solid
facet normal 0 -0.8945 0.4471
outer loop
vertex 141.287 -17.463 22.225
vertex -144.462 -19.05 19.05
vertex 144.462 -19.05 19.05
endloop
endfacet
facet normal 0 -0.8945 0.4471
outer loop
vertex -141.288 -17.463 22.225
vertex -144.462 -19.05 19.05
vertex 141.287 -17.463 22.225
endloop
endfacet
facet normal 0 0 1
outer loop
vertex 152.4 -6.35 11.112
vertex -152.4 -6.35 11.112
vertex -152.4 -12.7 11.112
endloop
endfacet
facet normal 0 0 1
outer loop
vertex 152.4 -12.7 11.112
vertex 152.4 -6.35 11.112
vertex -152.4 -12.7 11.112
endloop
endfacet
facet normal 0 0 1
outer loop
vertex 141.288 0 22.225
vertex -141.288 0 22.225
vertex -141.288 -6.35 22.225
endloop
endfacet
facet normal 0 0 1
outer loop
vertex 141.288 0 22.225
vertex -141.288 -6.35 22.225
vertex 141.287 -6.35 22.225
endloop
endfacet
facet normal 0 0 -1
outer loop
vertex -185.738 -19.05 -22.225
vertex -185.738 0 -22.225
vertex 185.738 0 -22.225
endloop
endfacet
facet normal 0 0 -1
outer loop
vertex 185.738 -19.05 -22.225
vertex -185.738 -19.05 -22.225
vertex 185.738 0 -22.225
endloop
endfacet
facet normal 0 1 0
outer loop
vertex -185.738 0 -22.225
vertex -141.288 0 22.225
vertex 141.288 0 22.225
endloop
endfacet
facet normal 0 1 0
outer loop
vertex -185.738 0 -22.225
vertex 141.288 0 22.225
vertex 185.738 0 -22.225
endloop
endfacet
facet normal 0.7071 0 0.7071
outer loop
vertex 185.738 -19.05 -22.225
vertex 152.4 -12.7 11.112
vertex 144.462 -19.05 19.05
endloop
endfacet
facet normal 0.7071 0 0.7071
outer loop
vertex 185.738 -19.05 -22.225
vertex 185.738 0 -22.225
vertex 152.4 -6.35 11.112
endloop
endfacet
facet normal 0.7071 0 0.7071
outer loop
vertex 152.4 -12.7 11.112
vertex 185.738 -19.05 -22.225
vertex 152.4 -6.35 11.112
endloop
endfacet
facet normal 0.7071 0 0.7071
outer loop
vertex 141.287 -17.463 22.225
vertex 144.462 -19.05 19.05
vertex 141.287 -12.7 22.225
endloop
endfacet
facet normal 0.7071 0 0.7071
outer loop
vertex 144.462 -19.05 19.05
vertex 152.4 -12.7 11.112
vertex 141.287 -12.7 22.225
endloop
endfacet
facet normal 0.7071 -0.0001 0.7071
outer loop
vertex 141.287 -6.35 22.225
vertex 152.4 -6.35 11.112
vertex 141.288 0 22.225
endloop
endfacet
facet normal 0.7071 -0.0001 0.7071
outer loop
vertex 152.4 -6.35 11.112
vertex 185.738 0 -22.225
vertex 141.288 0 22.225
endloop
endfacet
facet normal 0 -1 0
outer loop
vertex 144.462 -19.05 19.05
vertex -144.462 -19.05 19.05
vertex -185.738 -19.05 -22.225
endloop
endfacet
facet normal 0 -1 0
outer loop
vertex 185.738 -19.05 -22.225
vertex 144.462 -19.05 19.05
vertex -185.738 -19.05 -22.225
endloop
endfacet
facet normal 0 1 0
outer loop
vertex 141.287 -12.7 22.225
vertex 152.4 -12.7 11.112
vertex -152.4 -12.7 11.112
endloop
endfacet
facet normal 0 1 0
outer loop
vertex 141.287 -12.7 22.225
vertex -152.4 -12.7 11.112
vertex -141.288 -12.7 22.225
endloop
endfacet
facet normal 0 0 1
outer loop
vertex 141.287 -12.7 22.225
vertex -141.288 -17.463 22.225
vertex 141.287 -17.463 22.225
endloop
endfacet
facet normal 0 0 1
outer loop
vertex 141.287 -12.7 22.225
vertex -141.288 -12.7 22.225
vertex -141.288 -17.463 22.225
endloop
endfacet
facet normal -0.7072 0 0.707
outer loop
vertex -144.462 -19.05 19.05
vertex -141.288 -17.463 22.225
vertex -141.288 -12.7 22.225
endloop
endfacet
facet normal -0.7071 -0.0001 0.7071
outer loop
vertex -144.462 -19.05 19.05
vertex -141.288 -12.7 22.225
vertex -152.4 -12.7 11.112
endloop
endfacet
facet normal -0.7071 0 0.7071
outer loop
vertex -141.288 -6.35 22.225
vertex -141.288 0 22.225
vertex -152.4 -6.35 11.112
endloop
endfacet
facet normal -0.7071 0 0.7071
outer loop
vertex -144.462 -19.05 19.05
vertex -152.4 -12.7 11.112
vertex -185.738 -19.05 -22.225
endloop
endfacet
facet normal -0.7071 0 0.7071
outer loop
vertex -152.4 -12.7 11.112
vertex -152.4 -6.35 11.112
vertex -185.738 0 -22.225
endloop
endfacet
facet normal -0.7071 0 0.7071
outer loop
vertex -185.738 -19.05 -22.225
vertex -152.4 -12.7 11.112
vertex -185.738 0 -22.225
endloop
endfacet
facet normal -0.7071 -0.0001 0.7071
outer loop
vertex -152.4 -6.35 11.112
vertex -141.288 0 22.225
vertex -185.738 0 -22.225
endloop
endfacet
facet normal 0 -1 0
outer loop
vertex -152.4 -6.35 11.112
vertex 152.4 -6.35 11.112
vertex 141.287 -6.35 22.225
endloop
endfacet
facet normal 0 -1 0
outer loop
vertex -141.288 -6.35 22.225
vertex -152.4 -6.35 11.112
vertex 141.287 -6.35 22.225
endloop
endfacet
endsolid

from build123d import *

# Parameters (mm, degrees)
F0_W     = 371.475
F0_H     = 44.45
F1_DEPTH = 19.05
F2_W     = 6.35
F2_H     = 11.1125
F3_DEPTH = 371.476
F4_SIZE2 = 3.175
F4_SIZE  = 1.5875
F6_DEPTH = 19.051


with BuildPart() as f1:
    # F0 (on Front) → F1 (new body)
    with BuildSketch(Plane.XZ):
        Rectangle(F0_W, F0_H)
    extrude(amount=F1_DEPTH)

    # F2 (on face) → F3 (cut, through all)
    with BuildSketch(Plane(origin=(-185.7375, 0, 0), x_dir=(0, -1, 0), z_dir=(-1, 0, 0))):
        with Locations((9.525, 16.66875)):
            Rectangle(F2_W, F2_H)
    extrude(amount=-F3_DEPTH, mode=Mode.SUBTRACT)

    # F4
    f4_edges = [f1.edges().sort_by_distance(p)[0] for p in [
        (0, -19.05, 22.225),
    ]]
    chamfer(f4_edges, length=F4_SIZE, length2=F4_SIZE2)

    # F5 (on face) → F6 (cut, through all)
    with BuildSketch(Plane(origin=(0, 0, 0), x_dir=(-1, 0, 0), z_dir=(0, 1, 0))):
        Polygon((-185.7375, 22.225), (-185.7375, -22.225), (-141.2875, 22.225), align=None)
        Polygon((141.2875, 22.225), (185.7375, -22.225), (185.7375, 22.225), align=None)
    extrude(amount=-F6_DEPTH, mode=Mode.SUBTRACT)


solid = f1.part
